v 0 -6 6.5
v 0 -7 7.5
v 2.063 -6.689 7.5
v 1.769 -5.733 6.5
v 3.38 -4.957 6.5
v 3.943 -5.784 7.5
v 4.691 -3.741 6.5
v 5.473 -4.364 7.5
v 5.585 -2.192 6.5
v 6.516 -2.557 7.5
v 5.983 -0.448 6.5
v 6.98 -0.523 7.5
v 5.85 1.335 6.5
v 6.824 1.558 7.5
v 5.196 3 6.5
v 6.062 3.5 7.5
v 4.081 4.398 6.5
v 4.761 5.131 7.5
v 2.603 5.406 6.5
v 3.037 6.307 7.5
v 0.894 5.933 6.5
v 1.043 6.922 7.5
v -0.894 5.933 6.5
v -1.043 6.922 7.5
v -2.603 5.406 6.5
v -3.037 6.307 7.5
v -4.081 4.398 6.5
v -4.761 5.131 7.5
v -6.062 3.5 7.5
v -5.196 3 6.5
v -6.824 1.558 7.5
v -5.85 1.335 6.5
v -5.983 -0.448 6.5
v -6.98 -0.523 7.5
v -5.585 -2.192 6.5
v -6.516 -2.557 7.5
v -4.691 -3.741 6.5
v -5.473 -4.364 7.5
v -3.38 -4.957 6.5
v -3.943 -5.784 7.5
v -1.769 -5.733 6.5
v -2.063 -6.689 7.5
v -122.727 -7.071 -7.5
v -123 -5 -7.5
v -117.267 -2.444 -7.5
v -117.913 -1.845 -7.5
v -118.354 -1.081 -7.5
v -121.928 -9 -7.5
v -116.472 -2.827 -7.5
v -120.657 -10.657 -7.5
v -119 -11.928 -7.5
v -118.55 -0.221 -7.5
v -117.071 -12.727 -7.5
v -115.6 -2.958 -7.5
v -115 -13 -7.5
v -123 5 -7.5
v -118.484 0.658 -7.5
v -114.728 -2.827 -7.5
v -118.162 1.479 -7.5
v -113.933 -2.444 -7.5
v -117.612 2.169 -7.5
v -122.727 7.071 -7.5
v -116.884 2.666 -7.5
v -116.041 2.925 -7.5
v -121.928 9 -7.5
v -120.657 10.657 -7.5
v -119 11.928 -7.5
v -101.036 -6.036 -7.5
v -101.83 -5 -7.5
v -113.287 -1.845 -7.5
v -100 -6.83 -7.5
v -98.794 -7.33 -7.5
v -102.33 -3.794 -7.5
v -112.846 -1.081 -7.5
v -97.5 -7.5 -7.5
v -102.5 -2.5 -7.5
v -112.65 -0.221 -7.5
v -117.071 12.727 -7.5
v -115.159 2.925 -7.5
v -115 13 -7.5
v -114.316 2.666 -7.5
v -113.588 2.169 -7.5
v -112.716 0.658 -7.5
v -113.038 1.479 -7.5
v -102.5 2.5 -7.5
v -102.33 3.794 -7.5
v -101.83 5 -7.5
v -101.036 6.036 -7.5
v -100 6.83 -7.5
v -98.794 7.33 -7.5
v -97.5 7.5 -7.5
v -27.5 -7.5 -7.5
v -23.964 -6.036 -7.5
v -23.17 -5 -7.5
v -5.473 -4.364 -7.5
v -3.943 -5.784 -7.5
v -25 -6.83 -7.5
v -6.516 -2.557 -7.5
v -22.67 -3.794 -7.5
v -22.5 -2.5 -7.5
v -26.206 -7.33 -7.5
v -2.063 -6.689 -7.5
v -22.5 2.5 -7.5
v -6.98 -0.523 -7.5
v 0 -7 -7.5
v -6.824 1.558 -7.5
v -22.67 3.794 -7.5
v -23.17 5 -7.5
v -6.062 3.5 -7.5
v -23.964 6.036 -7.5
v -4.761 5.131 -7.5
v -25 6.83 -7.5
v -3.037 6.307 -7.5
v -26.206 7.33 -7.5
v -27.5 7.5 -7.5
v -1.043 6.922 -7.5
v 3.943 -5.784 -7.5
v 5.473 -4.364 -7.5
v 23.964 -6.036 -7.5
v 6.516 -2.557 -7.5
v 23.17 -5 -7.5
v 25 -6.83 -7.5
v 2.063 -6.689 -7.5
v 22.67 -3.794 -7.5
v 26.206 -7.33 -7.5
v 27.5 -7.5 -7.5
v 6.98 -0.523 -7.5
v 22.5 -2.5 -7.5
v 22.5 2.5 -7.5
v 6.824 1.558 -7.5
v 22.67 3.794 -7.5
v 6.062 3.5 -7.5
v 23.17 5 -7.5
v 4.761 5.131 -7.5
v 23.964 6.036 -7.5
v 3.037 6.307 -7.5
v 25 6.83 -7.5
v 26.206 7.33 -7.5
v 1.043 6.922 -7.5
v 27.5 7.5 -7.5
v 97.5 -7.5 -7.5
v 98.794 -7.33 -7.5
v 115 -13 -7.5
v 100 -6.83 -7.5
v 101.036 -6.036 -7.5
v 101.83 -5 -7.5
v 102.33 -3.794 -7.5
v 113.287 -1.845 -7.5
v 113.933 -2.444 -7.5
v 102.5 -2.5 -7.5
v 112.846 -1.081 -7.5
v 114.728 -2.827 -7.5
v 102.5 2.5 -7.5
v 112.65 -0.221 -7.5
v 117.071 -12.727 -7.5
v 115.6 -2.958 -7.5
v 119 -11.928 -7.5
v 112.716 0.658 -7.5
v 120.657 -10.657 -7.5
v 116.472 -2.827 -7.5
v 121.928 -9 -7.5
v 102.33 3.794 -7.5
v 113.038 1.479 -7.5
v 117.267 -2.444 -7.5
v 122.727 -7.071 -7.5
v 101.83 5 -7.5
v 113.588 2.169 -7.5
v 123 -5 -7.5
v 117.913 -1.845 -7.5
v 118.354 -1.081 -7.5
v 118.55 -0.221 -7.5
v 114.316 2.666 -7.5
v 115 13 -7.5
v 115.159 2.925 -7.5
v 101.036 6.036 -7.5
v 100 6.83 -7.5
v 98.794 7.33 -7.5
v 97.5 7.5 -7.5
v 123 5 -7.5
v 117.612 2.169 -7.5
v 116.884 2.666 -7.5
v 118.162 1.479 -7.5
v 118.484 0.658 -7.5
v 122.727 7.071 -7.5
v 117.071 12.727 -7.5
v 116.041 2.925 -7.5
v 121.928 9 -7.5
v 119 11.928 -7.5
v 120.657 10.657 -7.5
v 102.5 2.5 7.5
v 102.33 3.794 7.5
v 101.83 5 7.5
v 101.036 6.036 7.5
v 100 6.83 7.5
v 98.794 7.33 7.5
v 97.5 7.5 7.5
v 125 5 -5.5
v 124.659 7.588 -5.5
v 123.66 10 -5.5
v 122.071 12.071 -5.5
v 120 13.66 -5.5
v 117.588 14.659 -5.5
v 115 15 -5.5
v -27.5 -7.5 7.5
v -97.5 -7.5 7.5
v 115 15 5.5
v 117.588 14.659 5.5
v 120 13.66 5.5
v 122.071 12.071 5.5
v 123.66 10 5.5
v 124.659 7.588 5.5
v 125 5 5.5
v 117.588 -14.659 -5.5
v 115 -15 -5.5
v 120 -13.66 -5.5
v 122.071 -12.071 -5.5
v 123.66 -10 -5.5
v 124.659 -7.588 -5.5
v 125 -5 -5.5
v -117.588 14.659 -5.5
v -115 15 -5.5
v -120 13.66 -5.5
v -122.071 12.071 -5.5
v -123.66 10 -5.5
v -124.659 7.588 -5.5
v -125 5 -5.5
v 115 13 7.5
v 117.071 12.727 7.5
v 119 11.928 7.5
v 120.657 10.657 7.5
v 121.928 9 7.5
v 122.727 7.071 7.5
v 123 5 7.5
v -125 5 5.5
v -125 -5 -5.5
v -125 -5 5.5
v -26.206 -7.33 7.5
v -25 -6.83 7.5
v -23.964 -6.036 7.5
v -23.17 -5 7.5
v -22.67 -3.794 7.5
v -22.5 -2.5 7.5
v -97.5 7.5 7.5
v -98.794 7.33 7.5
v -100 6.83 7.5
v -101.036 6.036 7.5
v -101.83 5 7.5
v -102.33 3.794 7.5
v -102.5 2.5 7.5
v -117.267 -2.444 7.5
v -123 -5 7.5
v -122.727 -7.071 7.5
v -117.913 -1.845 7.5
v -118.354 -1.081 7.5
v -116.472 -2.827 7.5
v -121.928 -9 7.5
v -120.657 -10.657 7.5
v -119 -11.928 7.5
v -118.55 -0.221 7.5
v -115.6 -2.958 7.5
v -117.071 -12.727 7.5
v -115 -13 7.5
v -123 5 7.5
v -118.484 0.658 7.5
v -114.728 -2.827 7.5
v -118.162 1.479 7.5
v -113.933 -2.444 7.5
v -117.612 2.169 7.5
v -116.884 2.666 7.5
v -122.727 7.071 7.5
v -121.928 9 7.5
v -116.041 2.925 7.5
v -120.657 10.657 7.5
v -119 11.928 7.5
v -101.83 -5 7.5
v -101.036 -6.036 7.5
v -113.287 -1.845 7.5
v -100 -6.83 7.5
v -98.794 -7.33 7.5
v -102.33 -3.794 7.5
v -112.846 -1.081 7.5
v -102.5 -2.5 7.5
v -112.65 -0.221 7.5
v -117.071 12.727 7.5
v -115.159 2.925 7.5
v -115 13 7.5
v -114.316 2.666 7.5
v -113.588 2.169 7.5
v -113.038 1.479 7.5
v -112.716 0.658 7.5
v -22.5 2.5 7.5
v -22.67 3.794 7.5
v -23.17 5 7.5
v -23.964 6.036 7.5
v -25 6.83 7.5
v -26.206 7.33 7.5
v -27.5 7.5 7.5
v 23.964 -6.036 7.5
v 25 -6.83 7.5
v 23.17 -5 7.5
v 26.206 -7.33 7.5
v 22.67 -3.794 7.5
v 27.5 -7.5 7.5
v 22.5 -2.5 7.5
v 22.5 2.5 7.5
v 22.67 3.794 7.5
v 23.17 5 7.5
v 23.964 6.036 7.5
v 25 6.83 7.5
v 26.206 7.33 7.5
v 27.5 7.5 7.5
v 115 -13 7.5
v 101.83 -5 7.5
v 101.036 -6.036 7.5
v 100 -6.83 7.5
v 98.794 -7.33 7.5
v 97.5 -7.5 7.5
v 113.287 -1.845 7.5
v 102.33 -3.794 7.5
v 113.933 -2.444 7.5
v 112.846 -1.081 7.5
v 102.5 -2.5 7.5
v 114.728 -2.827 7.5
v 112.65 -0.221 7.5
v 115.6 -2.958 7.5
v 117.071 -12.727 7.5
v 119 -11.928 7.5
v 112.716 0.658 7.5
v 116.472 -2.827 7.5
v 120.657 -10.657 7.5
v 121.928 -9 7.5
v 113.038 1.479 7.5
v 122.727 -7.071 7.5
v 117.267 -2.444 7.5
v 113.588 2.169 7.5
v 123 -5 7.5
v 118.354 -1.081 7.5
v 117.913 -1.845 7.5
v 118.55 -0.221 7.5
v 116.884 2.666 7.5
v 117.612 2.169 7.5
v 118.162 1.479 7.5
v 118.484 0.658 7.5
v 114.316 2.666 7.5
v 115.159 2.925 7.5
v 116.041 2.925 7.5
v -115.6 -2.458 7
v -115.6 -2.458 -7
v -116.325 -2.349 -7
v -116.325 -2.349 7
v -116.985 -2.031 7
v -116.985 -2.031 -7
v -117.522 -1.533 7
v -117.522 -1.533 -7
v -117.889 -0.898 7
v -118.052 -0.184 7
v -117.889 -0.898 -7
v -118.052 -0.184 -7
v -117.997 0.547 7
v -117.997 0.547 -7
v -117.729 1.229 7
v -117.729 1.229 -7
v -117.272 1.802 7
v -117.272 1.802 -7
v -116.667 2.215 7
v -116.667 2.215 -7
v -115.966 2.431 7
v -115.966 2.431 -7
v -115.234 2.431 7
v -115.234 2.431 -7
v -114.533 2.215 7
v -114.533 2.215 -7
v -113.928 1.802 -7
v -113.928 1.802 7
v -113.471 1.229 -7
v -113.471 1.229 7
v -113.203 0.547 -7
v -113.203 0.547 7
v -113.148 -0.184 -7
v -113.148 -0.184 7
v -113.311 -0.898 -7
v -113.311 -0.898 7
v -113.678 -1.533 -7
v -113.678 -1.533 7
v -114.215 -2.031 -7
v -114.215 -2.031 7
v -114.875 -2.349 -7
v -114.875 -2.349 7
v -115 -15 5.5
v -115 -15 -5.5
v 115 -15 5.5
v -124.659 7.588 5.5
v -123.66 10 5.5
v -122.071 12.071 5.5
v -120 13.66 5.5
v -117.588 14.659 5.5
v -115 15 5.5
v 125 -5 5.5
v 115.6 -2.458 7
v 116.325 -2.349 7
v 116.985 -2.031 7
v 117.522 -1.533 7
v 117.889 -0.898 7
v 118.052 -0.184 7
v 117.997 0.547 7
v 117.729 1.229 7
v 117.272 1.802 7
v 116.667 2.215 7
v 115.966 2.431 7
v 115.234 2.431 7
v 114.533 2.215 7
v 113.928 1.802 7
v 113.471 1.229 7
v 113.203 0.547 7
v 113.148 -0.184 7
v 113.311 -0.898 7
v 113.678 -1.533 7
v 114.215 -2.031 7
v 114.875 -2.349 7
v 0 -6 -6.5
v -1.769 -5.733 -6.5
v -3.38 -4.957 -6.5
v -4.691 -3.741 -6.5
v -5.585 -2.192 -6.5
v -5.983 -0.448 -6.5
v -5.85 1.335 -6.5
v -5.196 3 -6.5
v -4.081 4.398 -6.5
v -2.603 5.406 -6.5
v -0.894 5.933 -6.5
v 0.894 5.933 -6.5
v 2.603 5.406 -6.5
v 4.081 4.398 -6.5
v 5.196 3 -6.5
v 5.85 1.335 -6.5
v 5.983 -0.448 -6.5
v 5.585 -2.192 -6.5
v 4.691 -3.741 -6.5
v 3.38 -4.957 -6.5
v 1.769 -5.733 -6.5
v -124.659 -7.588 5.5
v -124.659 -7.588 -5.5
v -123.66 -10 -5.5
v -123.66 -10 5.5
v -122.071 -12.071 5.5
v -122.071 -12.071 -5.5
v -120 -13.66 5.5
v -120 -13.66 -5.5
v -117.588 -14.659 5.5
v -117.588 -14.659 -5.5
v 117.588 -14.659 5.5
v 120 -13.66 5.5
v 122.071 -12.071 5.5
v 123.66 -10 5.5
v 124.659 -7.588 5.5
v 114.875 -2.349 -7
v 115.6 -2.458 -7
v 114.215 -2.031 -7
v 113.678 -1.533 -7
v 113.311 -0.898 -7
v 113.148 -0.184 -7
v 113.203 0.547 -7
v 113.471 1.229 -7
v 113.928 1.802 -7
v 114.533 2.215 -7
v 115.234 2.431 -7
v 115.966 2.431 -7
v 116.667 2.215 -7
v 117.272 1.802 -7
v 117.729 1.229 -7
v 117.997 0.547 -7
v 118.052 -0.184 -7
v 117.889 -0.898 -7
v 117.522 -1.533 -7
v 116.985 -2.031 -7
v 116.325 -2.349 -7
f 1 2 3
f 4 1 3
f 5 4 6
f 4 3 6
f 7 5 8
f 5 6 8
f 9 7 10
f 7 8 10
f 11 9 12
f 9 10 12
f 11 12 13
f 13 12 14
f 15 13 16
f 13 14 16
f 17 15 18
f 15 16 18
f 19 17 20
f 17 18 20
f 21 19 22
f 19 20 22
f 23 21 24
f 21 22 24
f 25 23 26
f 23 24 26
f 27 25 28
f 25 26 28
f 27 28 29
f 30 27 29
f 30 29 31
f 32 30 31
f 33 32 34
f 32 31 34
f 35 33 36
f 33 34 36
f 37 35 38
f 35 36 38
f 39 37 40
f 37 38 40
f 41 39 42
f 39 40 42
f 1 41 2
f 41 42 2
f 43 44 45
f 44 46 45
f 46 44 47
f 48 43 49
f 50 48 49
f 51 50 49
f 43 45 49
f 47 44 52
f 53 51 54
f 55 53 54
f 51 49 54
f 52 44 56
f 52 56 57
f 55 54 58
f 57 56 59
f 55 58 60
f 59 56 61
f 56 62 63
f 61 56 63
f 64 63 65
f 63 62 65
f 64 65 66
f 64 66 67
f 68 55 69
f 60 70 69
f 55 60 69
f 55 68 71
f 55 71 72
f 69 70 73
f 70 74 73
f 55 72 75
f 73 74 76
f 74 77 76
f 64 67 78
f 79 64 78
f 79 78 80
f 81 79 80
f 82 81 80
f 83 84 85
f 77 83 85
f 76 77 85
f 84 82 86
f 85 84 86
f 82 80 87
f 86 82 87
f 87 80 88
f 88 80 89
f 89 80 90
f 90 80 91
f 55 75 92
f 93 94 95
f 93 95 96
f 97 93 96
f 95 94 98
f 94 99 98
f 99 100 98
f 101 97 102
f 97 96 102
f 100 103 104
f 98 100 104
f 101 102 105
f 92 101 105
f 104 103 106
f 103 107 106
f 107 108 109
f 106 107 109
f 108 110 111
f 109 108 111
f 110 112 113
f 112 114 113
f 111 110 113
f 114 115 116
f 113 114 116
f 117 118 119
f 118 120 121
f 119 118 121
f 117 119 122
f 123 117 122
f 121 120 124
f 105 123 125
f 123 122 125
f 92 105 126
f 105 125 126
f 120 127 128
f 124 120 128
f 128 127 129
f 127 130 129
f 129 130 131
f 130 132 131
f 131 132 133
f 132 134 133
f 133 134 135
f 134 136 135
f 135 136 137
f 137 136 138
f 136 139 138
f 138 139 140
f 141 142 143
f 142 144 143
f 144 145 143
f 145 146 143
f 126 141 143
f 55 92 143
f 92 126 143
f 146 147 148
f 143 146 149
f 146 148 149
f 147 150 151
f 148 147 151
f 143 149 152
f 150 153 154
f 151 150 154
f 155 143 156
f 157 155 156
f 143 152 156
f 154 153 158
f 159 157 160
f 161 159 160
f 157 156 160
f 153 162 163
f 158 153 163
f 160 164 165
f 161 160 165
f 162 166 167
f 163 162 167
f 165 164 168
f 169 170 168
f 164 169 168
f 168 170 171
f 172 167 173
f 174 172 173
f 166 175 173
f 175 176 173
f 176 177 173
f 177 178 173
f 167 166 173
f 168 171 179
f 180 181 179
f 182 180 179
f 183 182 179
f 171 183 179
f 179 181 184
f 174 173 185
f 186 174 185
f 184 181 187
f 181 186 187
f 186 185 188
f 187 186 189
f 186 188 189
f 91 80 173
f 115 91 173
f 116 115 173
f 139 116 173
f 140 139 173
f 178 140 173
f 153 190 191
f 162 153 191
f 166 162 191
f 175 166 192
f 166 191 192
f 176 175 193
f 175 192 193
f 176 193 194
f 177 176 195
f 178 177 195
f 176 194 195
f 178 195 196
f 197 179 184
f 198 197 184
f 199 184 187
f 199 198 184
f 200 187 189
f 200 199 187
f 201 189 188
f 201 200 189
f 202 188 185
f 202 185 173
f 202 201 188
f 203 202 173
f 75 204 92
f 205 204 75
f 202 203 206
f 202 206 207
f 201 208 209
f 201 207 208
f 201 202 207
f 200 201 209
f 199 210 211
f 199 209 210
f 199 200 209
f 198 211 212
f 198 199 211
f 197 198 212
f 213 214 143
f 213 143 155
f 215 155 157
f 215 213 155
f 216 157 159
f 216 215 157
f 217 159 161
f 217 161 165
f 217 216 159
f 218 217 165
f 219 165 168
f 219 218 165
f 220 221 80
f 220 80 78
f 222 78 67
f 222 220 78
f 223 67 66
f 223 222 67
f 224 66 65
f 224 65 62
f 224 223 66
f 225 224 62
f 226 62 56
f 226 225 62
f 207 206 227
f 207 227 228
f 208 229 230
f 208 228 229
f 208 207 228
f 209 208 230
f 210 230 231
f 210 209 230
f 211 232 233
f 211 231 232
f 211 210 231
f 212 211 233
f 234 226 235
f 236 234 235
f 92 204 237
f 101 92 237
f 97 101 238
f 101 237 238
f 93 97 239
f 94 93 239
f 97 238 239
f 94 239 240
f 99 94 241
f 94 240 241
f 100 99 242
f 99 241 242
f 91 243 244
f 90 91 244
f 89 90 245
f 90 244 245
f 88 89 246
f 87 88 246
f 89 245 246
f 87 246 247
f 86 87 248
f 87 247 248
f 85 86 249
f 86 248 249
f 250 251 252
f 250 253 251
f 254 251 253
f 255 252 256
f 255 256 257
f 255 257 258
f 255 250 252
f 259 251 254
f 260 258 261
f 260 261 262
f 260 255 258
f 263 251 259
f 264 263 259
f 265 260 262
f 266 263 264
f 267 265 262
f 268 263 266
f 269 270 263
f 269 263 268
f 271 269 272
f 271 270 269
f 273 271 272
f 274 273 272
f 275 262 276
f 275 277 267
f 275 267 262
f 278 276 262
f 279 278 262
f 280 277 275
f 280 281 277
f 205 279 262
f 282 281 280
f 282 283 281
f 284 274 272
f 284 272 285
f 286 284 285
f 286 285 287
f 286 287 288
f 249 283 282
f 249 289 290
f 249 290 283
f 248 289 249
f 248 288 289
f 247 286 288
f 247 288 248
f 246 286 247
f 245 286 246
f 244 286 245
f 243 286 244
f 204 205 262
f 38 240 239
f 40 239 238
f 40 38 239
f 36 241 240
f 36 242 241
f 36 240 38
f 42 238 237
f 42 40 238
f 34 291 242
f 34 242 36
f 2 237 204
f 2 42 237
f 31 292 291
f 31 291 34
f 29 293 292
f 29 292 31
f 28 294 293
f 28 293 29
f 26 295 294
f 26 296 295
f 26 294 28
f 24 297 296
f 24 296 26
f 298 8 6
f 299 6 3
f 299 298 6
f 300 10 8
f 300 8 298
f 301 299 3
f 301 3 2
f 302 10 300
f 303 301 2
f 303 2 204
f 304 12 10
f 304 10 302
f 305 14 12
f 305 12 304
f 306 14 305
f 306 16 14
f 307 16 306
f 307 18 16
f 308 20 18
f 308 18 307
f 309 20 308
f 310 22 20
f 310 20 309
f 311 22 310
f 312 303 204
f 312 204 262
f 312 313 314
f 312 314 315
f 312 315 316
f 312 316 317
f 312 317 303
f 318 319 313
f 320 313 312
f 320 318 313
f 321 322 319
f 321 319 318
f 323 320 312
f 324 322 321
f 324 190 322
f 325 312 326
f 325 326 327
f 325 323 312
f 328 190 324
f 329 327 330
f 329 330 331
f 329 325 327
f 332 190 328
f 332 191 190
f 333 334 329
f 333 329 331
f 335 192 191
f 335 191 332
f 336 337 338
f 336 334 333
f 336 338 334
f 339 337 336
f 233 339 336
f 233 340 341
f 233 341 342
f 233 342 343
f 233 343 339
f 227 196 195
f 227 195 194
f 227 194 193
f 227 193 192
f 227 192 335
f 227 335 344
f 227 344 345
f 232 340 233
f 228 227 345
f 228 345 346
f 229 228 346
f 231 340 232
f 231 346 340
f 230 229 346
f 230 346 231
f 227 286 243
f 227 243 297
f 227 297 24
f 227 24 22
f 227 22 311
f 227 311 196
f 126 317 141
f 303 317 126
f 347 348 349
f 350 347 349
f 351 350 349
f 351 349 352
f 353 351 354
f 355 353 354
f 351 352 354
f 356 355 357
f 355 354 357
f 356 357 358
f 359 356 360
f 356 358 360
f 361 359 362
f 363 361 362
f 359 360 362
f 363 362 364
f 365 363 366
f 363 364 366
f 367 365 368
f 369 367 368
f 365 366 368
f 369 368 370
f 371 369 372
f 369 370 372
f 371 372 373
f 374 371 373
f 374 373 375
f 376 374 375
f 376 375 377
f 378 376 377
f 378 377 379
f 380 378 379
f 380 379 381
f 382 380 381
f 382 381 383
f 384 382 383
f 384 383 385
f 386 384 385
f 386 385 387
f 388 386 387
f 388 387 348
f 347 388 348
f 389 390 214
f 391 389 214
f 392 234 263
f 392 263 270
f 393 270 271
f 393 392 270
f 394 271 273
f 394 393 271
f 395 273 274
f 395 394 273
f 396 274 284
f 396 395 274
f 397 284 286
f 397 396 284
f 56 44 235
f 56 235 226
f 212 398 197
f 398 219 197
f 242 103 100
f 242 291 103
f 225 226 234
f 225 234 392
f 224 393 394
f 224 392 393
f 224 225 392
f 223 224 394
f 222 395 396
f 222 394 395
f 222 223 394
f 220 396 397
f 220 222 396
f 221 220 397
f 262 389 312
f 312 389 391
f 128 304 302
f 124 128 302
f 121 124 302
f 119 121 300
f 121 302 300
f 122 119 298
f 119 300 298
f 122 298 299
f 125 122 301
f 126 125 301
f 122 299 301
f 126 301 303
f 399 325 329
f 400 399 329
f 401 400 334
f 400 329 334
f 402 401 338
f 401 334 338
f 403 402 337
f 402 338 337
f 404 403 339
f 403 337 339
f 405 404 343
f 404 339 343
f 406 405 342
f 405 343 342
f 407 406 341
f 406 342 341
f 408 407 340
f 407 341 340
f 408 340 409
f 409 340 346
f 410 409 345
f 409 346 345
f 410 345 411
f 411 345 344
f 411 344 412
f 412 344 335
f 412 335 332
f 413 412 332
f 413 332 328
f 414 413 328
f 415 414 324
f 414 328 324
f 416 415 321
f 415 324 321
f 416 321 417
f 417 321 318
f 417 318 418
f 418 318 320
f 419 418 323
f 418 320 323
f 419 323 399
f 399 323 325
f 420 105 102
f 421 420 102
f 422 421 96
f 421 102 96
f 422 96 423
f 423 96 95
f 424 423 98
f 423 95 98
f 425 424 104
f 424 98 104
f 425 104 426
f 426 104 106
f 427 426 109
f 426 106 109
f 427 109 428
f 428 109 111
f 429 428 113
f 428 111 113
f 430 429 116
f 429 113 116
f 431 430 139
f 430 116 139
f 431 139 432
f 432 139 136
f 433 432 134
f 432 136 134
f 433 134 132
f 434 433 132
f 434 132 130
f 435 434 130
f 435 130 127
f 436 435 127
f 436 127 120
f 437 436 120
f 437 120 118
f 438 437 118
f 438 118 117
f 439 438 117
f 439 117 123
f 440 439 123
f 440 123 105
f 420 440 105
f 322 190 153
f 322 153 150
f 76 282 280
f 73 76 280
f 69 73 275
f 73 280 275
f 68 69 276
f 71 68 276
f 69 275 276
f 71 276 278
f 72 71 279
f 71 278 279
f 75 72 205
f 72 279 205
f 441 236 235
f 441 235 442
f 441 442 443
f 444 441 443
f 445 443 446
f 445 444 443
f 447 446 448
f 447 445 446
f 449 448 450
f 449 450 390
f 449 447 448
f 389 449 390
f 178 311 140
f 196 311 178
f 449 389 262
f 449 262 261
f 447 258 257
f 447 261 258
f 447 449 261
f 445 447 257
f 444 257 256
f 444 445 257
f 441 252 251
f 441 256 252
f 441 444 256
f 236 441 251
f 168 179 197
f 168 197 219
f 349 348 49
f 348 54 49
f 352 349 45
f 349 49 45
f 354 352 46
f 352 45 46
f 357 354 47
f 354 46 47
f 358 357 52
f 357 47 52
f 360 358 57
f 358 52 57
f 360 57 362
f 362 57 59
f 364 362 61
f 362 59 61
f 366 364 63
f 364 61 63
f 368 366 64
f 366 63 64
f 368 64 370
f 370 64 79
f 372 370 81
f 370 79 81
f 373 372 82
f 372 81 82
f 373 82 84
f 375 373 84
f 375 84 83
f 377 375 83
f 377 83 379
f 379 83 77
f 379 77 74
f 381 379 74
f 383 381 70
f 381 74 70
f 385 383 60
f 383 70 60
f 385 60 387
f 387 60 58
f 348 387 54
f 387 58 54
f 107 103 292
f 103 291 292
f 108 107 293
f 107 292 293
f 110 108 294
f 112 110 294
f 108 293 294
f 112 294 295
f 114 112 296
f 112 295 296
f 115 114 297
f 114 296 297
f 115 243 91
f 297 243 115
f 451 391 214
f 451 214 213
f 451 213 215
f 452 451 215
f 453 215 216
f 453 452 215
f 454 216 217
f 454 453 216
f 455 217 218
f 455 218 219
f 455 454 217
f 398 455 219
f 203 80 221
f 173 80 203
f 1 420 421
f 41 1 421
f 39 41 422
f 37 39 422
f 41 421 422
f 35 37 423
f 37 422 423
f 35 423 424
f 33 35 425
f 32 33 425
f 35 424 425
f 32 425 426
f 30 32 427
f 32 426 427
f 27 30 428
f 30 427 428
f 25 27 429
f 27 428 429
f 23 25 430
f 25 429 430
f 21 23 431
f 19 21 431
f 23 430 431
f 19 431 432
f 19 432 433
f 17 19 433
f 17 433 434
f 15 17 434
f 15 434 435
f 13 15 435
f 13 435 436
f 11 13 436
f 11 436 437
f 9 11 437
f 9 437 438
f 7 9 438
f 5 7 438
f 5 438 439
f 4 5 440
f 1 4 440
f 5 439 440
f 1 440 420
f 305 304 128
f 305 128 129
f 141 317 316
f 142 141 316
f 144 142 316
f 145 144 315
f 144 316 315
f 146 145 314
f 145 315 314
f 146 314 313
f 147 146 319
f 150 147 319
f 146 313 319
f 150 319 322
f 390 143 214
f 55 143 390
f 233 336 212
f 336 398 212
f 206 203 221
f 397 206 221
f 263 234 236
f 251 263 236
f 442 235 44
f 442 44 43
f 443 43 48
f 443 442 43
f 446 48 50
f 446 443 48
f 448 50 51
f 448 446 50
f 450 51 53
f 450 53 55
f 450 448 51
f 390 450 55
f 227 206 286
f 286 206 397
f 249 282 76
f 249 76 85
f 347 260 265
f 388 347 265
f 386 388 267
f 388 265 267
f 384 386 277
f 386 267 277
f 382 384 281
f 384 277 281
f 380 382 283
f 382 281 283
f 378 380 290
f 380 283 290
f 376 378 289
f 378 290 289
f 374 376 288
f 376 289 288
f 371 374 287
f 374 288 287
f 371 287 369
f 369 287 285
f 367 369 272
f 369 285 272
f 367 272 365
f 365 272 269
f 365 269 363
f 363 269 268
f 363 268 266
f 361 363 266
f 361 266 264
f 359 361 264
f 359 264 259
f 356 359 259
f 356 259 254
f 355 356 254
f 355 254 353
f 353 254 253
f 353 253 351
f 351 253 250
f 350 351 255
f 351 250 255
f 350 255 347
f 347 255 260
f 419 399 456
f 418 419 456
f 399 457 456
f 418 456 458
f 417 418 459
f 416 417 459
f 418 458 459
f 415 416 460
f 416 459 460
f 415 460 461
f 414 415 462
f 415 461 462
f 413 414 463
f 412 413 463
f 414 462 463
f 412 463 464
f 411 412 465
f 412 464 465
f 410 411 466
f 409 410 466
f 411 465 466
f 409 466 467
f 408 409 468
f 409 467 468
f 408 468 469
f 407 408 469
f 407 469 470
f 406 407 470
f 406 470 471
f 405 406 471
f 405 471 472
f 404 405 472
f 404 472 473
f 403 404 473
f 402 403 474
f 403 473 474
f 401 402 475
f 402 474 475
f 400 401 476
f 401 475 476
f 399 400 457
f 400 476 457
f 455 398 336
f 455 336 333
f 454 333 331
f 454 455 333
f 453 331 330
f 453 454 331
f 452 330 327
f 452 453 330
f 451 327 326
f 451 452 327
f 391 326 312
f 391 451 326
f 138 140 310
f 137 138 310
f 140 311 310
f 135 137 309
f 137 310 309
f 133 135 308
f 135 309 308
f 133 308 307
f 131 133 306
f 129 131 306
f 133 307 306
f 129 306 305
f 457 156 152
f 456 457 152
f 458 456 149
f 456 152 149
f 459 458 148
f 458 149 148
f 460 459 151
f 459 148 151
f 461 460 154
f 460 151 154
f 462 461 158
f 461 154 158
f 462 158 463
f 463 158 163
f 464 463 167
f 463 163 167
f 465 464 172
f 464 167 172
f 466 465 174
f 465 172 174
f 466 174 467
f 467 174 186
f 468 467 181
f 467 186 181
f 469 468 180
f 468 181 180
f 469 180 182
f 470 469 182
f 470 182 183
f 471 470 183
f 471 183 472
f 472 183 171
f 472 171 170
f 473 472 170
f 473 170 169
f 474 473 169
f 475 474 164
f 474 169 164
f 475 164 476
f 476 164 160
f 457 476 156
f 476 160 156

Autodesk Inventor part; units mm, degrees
ref_plane "YZ Plane" through (0, 0, 0) normal (1, 0, 0) x (0, 1, 0)
ref_plane "XZ Plane" through (0, 0, 0) normal (0, 1, 0) x (-1, 0, 0)
ref_plane "XY Plane" through (0, 0, 0) normal (0, 0, 1) x (1, 0, 0)
sketch "Skizze1" plane through (0, 0, 0) normal (0, 0, 1) x (1, 0, 0)
  line L0 (-175, 0) -> (175, 0) construction
  line L1 (0, 21) -> (0, -21) construction
  line L2 (-125, -15) -> (125, -15)
  line L3 (125, -15) -> (125, 15)
  line L4 (125, 15) -> (-125, 15)
  line L5 (-125, 15) -> (-125, -15)
  line L6 (-125, -15) -> (125, 15) construction
  line L7 (125, -15) -> (-125, 15) construction
  point P0 (0, 0)
  dimension "d0" = 250
  dimension "d1" = 30
extrude "Grundkörper" add sketch "Skizze1" along normal mid plane 15
sketch "Skizze2" plane through (0, 0, 7.5) normal (0, 0, 1) x (1, 0, 0)
  line L0 (0, 21) -> (0, -21) construction
  point P0 (0, 0)
  point P1 (-115.6, 0)
  point P2 (115.6, 0)
  dimension "d4" = 231.2
hole "M6" at (-115.6, 0, 7.5) at (115.6, 0, 7.5) direction (0, 0, -1) diameter 4.917 end through all thread size "M6x1" class "6H" standard "ISO Metric profile"
sketch "Skizze3" plane through (0, 0, 7.5) normal (0, 0, 1) x (1, 0, 0)
  line L0 (0, 21) -> (0, -21) construction
  line L1 (-97.5, 7.5) -> (-27.5, 7.5)
  line L2 (-22.5, 2.5) -> (-22.5, -2.5)
  line L3 (-27.5, -7.5) -> (-97.5, -7.5)
  line L4 (-102.5, -2.5) -> (-102.5, 2.5)
  line L5 (-175, 0) -> (175, 0) construction
  line L6 (125, 15) -> (-125, 15) projected
  line L7 (0, 15) -> (-125, 15)
  line L8 (-62.5, 15) -> (-62.5, -15) construction
  line L9 (-125, -15) -> (125, -15) construction
  arc A0 (-102.5, -2.5) -> (-97.5, -7.5) centre (-97.5, -2.5) ccw
  arc A1 (-97.5, 7.5) -> (-102.5, 2.5) centre (-97.5, 2.5) ccw
  arc A2 (-22.5, 2.5) -> (-27.5, 7.5) centre (-27.5, 2.5) ccw
  arc A3 (-27.5, -7.5) -> (-22.5, -2.5) centre (-27.5, -2.5) ccw
  point P0 (0, 0)
  point P1 (-102.5, 7.5)
  point P2 (-22.5, 7.5)
  dimension "d16" = 15
  dimension "d17" = 80
  dimension "d18" = 5
extrude "Ausschnitt_Gewichtsreduktion" cut sketch "Skizze3" against normal through all
mirror "Spiegeln_Ausschnitt_Gewichtsreduktion" about plane through (0, 0, 0) normal (1, 0, 0) of "Ausschnitt_Gewichtsreduktion"
chamfer "Fase_M6_Gewinde" distance 0.5 angle 45 4 edges at (-115.6, 2.4585, -7.5) (115.6, 2.4585, -7.5) (-115.6, 2.4585, 7.5) (115.6, 2.4585, 7.5)
sketch "Skizze4" plane through (0, 0, 7.5) normal (0, 0, 1) x (1, 0, 0)
  line L0 (0, 21) -> (0, -21) construction
  line L1 (-175, 0) -> (175, 0) construction
  point P0 (0, 0)
  point P1 (0, 0)
hole "12H7_Bohrung" at (0, 0, 7.5) direction (0, 0, -1) diameter 12 end through all
fillet "Abrundung" radius 10 4 edges at (-125, 15, 0) (-125, -15, 0) (125, -15, 0) (125, 15, 0)
chamfer "Fase_Allgemein" distance 2 angle 45 8 edges at (0, -15, 7.5) (122.0711, -12.0711, 7.5) (0, 15, 7.5) (-122.0711, 12.0711, 7.5) (0, -15, -7.5) (-122.0711, 12.0711, -7.5) (0, 15, -7.5) (122.0711, -12.0711, -7.5)
chamfer "Fase_Bohrung" distance 1 angle 45 2 edges at (0, 6, 7.5) (0, 6, -7.5)
properties part number "200-60-DIFFERENTIAL-CONNECTOR-01" material "Edelstahl"
